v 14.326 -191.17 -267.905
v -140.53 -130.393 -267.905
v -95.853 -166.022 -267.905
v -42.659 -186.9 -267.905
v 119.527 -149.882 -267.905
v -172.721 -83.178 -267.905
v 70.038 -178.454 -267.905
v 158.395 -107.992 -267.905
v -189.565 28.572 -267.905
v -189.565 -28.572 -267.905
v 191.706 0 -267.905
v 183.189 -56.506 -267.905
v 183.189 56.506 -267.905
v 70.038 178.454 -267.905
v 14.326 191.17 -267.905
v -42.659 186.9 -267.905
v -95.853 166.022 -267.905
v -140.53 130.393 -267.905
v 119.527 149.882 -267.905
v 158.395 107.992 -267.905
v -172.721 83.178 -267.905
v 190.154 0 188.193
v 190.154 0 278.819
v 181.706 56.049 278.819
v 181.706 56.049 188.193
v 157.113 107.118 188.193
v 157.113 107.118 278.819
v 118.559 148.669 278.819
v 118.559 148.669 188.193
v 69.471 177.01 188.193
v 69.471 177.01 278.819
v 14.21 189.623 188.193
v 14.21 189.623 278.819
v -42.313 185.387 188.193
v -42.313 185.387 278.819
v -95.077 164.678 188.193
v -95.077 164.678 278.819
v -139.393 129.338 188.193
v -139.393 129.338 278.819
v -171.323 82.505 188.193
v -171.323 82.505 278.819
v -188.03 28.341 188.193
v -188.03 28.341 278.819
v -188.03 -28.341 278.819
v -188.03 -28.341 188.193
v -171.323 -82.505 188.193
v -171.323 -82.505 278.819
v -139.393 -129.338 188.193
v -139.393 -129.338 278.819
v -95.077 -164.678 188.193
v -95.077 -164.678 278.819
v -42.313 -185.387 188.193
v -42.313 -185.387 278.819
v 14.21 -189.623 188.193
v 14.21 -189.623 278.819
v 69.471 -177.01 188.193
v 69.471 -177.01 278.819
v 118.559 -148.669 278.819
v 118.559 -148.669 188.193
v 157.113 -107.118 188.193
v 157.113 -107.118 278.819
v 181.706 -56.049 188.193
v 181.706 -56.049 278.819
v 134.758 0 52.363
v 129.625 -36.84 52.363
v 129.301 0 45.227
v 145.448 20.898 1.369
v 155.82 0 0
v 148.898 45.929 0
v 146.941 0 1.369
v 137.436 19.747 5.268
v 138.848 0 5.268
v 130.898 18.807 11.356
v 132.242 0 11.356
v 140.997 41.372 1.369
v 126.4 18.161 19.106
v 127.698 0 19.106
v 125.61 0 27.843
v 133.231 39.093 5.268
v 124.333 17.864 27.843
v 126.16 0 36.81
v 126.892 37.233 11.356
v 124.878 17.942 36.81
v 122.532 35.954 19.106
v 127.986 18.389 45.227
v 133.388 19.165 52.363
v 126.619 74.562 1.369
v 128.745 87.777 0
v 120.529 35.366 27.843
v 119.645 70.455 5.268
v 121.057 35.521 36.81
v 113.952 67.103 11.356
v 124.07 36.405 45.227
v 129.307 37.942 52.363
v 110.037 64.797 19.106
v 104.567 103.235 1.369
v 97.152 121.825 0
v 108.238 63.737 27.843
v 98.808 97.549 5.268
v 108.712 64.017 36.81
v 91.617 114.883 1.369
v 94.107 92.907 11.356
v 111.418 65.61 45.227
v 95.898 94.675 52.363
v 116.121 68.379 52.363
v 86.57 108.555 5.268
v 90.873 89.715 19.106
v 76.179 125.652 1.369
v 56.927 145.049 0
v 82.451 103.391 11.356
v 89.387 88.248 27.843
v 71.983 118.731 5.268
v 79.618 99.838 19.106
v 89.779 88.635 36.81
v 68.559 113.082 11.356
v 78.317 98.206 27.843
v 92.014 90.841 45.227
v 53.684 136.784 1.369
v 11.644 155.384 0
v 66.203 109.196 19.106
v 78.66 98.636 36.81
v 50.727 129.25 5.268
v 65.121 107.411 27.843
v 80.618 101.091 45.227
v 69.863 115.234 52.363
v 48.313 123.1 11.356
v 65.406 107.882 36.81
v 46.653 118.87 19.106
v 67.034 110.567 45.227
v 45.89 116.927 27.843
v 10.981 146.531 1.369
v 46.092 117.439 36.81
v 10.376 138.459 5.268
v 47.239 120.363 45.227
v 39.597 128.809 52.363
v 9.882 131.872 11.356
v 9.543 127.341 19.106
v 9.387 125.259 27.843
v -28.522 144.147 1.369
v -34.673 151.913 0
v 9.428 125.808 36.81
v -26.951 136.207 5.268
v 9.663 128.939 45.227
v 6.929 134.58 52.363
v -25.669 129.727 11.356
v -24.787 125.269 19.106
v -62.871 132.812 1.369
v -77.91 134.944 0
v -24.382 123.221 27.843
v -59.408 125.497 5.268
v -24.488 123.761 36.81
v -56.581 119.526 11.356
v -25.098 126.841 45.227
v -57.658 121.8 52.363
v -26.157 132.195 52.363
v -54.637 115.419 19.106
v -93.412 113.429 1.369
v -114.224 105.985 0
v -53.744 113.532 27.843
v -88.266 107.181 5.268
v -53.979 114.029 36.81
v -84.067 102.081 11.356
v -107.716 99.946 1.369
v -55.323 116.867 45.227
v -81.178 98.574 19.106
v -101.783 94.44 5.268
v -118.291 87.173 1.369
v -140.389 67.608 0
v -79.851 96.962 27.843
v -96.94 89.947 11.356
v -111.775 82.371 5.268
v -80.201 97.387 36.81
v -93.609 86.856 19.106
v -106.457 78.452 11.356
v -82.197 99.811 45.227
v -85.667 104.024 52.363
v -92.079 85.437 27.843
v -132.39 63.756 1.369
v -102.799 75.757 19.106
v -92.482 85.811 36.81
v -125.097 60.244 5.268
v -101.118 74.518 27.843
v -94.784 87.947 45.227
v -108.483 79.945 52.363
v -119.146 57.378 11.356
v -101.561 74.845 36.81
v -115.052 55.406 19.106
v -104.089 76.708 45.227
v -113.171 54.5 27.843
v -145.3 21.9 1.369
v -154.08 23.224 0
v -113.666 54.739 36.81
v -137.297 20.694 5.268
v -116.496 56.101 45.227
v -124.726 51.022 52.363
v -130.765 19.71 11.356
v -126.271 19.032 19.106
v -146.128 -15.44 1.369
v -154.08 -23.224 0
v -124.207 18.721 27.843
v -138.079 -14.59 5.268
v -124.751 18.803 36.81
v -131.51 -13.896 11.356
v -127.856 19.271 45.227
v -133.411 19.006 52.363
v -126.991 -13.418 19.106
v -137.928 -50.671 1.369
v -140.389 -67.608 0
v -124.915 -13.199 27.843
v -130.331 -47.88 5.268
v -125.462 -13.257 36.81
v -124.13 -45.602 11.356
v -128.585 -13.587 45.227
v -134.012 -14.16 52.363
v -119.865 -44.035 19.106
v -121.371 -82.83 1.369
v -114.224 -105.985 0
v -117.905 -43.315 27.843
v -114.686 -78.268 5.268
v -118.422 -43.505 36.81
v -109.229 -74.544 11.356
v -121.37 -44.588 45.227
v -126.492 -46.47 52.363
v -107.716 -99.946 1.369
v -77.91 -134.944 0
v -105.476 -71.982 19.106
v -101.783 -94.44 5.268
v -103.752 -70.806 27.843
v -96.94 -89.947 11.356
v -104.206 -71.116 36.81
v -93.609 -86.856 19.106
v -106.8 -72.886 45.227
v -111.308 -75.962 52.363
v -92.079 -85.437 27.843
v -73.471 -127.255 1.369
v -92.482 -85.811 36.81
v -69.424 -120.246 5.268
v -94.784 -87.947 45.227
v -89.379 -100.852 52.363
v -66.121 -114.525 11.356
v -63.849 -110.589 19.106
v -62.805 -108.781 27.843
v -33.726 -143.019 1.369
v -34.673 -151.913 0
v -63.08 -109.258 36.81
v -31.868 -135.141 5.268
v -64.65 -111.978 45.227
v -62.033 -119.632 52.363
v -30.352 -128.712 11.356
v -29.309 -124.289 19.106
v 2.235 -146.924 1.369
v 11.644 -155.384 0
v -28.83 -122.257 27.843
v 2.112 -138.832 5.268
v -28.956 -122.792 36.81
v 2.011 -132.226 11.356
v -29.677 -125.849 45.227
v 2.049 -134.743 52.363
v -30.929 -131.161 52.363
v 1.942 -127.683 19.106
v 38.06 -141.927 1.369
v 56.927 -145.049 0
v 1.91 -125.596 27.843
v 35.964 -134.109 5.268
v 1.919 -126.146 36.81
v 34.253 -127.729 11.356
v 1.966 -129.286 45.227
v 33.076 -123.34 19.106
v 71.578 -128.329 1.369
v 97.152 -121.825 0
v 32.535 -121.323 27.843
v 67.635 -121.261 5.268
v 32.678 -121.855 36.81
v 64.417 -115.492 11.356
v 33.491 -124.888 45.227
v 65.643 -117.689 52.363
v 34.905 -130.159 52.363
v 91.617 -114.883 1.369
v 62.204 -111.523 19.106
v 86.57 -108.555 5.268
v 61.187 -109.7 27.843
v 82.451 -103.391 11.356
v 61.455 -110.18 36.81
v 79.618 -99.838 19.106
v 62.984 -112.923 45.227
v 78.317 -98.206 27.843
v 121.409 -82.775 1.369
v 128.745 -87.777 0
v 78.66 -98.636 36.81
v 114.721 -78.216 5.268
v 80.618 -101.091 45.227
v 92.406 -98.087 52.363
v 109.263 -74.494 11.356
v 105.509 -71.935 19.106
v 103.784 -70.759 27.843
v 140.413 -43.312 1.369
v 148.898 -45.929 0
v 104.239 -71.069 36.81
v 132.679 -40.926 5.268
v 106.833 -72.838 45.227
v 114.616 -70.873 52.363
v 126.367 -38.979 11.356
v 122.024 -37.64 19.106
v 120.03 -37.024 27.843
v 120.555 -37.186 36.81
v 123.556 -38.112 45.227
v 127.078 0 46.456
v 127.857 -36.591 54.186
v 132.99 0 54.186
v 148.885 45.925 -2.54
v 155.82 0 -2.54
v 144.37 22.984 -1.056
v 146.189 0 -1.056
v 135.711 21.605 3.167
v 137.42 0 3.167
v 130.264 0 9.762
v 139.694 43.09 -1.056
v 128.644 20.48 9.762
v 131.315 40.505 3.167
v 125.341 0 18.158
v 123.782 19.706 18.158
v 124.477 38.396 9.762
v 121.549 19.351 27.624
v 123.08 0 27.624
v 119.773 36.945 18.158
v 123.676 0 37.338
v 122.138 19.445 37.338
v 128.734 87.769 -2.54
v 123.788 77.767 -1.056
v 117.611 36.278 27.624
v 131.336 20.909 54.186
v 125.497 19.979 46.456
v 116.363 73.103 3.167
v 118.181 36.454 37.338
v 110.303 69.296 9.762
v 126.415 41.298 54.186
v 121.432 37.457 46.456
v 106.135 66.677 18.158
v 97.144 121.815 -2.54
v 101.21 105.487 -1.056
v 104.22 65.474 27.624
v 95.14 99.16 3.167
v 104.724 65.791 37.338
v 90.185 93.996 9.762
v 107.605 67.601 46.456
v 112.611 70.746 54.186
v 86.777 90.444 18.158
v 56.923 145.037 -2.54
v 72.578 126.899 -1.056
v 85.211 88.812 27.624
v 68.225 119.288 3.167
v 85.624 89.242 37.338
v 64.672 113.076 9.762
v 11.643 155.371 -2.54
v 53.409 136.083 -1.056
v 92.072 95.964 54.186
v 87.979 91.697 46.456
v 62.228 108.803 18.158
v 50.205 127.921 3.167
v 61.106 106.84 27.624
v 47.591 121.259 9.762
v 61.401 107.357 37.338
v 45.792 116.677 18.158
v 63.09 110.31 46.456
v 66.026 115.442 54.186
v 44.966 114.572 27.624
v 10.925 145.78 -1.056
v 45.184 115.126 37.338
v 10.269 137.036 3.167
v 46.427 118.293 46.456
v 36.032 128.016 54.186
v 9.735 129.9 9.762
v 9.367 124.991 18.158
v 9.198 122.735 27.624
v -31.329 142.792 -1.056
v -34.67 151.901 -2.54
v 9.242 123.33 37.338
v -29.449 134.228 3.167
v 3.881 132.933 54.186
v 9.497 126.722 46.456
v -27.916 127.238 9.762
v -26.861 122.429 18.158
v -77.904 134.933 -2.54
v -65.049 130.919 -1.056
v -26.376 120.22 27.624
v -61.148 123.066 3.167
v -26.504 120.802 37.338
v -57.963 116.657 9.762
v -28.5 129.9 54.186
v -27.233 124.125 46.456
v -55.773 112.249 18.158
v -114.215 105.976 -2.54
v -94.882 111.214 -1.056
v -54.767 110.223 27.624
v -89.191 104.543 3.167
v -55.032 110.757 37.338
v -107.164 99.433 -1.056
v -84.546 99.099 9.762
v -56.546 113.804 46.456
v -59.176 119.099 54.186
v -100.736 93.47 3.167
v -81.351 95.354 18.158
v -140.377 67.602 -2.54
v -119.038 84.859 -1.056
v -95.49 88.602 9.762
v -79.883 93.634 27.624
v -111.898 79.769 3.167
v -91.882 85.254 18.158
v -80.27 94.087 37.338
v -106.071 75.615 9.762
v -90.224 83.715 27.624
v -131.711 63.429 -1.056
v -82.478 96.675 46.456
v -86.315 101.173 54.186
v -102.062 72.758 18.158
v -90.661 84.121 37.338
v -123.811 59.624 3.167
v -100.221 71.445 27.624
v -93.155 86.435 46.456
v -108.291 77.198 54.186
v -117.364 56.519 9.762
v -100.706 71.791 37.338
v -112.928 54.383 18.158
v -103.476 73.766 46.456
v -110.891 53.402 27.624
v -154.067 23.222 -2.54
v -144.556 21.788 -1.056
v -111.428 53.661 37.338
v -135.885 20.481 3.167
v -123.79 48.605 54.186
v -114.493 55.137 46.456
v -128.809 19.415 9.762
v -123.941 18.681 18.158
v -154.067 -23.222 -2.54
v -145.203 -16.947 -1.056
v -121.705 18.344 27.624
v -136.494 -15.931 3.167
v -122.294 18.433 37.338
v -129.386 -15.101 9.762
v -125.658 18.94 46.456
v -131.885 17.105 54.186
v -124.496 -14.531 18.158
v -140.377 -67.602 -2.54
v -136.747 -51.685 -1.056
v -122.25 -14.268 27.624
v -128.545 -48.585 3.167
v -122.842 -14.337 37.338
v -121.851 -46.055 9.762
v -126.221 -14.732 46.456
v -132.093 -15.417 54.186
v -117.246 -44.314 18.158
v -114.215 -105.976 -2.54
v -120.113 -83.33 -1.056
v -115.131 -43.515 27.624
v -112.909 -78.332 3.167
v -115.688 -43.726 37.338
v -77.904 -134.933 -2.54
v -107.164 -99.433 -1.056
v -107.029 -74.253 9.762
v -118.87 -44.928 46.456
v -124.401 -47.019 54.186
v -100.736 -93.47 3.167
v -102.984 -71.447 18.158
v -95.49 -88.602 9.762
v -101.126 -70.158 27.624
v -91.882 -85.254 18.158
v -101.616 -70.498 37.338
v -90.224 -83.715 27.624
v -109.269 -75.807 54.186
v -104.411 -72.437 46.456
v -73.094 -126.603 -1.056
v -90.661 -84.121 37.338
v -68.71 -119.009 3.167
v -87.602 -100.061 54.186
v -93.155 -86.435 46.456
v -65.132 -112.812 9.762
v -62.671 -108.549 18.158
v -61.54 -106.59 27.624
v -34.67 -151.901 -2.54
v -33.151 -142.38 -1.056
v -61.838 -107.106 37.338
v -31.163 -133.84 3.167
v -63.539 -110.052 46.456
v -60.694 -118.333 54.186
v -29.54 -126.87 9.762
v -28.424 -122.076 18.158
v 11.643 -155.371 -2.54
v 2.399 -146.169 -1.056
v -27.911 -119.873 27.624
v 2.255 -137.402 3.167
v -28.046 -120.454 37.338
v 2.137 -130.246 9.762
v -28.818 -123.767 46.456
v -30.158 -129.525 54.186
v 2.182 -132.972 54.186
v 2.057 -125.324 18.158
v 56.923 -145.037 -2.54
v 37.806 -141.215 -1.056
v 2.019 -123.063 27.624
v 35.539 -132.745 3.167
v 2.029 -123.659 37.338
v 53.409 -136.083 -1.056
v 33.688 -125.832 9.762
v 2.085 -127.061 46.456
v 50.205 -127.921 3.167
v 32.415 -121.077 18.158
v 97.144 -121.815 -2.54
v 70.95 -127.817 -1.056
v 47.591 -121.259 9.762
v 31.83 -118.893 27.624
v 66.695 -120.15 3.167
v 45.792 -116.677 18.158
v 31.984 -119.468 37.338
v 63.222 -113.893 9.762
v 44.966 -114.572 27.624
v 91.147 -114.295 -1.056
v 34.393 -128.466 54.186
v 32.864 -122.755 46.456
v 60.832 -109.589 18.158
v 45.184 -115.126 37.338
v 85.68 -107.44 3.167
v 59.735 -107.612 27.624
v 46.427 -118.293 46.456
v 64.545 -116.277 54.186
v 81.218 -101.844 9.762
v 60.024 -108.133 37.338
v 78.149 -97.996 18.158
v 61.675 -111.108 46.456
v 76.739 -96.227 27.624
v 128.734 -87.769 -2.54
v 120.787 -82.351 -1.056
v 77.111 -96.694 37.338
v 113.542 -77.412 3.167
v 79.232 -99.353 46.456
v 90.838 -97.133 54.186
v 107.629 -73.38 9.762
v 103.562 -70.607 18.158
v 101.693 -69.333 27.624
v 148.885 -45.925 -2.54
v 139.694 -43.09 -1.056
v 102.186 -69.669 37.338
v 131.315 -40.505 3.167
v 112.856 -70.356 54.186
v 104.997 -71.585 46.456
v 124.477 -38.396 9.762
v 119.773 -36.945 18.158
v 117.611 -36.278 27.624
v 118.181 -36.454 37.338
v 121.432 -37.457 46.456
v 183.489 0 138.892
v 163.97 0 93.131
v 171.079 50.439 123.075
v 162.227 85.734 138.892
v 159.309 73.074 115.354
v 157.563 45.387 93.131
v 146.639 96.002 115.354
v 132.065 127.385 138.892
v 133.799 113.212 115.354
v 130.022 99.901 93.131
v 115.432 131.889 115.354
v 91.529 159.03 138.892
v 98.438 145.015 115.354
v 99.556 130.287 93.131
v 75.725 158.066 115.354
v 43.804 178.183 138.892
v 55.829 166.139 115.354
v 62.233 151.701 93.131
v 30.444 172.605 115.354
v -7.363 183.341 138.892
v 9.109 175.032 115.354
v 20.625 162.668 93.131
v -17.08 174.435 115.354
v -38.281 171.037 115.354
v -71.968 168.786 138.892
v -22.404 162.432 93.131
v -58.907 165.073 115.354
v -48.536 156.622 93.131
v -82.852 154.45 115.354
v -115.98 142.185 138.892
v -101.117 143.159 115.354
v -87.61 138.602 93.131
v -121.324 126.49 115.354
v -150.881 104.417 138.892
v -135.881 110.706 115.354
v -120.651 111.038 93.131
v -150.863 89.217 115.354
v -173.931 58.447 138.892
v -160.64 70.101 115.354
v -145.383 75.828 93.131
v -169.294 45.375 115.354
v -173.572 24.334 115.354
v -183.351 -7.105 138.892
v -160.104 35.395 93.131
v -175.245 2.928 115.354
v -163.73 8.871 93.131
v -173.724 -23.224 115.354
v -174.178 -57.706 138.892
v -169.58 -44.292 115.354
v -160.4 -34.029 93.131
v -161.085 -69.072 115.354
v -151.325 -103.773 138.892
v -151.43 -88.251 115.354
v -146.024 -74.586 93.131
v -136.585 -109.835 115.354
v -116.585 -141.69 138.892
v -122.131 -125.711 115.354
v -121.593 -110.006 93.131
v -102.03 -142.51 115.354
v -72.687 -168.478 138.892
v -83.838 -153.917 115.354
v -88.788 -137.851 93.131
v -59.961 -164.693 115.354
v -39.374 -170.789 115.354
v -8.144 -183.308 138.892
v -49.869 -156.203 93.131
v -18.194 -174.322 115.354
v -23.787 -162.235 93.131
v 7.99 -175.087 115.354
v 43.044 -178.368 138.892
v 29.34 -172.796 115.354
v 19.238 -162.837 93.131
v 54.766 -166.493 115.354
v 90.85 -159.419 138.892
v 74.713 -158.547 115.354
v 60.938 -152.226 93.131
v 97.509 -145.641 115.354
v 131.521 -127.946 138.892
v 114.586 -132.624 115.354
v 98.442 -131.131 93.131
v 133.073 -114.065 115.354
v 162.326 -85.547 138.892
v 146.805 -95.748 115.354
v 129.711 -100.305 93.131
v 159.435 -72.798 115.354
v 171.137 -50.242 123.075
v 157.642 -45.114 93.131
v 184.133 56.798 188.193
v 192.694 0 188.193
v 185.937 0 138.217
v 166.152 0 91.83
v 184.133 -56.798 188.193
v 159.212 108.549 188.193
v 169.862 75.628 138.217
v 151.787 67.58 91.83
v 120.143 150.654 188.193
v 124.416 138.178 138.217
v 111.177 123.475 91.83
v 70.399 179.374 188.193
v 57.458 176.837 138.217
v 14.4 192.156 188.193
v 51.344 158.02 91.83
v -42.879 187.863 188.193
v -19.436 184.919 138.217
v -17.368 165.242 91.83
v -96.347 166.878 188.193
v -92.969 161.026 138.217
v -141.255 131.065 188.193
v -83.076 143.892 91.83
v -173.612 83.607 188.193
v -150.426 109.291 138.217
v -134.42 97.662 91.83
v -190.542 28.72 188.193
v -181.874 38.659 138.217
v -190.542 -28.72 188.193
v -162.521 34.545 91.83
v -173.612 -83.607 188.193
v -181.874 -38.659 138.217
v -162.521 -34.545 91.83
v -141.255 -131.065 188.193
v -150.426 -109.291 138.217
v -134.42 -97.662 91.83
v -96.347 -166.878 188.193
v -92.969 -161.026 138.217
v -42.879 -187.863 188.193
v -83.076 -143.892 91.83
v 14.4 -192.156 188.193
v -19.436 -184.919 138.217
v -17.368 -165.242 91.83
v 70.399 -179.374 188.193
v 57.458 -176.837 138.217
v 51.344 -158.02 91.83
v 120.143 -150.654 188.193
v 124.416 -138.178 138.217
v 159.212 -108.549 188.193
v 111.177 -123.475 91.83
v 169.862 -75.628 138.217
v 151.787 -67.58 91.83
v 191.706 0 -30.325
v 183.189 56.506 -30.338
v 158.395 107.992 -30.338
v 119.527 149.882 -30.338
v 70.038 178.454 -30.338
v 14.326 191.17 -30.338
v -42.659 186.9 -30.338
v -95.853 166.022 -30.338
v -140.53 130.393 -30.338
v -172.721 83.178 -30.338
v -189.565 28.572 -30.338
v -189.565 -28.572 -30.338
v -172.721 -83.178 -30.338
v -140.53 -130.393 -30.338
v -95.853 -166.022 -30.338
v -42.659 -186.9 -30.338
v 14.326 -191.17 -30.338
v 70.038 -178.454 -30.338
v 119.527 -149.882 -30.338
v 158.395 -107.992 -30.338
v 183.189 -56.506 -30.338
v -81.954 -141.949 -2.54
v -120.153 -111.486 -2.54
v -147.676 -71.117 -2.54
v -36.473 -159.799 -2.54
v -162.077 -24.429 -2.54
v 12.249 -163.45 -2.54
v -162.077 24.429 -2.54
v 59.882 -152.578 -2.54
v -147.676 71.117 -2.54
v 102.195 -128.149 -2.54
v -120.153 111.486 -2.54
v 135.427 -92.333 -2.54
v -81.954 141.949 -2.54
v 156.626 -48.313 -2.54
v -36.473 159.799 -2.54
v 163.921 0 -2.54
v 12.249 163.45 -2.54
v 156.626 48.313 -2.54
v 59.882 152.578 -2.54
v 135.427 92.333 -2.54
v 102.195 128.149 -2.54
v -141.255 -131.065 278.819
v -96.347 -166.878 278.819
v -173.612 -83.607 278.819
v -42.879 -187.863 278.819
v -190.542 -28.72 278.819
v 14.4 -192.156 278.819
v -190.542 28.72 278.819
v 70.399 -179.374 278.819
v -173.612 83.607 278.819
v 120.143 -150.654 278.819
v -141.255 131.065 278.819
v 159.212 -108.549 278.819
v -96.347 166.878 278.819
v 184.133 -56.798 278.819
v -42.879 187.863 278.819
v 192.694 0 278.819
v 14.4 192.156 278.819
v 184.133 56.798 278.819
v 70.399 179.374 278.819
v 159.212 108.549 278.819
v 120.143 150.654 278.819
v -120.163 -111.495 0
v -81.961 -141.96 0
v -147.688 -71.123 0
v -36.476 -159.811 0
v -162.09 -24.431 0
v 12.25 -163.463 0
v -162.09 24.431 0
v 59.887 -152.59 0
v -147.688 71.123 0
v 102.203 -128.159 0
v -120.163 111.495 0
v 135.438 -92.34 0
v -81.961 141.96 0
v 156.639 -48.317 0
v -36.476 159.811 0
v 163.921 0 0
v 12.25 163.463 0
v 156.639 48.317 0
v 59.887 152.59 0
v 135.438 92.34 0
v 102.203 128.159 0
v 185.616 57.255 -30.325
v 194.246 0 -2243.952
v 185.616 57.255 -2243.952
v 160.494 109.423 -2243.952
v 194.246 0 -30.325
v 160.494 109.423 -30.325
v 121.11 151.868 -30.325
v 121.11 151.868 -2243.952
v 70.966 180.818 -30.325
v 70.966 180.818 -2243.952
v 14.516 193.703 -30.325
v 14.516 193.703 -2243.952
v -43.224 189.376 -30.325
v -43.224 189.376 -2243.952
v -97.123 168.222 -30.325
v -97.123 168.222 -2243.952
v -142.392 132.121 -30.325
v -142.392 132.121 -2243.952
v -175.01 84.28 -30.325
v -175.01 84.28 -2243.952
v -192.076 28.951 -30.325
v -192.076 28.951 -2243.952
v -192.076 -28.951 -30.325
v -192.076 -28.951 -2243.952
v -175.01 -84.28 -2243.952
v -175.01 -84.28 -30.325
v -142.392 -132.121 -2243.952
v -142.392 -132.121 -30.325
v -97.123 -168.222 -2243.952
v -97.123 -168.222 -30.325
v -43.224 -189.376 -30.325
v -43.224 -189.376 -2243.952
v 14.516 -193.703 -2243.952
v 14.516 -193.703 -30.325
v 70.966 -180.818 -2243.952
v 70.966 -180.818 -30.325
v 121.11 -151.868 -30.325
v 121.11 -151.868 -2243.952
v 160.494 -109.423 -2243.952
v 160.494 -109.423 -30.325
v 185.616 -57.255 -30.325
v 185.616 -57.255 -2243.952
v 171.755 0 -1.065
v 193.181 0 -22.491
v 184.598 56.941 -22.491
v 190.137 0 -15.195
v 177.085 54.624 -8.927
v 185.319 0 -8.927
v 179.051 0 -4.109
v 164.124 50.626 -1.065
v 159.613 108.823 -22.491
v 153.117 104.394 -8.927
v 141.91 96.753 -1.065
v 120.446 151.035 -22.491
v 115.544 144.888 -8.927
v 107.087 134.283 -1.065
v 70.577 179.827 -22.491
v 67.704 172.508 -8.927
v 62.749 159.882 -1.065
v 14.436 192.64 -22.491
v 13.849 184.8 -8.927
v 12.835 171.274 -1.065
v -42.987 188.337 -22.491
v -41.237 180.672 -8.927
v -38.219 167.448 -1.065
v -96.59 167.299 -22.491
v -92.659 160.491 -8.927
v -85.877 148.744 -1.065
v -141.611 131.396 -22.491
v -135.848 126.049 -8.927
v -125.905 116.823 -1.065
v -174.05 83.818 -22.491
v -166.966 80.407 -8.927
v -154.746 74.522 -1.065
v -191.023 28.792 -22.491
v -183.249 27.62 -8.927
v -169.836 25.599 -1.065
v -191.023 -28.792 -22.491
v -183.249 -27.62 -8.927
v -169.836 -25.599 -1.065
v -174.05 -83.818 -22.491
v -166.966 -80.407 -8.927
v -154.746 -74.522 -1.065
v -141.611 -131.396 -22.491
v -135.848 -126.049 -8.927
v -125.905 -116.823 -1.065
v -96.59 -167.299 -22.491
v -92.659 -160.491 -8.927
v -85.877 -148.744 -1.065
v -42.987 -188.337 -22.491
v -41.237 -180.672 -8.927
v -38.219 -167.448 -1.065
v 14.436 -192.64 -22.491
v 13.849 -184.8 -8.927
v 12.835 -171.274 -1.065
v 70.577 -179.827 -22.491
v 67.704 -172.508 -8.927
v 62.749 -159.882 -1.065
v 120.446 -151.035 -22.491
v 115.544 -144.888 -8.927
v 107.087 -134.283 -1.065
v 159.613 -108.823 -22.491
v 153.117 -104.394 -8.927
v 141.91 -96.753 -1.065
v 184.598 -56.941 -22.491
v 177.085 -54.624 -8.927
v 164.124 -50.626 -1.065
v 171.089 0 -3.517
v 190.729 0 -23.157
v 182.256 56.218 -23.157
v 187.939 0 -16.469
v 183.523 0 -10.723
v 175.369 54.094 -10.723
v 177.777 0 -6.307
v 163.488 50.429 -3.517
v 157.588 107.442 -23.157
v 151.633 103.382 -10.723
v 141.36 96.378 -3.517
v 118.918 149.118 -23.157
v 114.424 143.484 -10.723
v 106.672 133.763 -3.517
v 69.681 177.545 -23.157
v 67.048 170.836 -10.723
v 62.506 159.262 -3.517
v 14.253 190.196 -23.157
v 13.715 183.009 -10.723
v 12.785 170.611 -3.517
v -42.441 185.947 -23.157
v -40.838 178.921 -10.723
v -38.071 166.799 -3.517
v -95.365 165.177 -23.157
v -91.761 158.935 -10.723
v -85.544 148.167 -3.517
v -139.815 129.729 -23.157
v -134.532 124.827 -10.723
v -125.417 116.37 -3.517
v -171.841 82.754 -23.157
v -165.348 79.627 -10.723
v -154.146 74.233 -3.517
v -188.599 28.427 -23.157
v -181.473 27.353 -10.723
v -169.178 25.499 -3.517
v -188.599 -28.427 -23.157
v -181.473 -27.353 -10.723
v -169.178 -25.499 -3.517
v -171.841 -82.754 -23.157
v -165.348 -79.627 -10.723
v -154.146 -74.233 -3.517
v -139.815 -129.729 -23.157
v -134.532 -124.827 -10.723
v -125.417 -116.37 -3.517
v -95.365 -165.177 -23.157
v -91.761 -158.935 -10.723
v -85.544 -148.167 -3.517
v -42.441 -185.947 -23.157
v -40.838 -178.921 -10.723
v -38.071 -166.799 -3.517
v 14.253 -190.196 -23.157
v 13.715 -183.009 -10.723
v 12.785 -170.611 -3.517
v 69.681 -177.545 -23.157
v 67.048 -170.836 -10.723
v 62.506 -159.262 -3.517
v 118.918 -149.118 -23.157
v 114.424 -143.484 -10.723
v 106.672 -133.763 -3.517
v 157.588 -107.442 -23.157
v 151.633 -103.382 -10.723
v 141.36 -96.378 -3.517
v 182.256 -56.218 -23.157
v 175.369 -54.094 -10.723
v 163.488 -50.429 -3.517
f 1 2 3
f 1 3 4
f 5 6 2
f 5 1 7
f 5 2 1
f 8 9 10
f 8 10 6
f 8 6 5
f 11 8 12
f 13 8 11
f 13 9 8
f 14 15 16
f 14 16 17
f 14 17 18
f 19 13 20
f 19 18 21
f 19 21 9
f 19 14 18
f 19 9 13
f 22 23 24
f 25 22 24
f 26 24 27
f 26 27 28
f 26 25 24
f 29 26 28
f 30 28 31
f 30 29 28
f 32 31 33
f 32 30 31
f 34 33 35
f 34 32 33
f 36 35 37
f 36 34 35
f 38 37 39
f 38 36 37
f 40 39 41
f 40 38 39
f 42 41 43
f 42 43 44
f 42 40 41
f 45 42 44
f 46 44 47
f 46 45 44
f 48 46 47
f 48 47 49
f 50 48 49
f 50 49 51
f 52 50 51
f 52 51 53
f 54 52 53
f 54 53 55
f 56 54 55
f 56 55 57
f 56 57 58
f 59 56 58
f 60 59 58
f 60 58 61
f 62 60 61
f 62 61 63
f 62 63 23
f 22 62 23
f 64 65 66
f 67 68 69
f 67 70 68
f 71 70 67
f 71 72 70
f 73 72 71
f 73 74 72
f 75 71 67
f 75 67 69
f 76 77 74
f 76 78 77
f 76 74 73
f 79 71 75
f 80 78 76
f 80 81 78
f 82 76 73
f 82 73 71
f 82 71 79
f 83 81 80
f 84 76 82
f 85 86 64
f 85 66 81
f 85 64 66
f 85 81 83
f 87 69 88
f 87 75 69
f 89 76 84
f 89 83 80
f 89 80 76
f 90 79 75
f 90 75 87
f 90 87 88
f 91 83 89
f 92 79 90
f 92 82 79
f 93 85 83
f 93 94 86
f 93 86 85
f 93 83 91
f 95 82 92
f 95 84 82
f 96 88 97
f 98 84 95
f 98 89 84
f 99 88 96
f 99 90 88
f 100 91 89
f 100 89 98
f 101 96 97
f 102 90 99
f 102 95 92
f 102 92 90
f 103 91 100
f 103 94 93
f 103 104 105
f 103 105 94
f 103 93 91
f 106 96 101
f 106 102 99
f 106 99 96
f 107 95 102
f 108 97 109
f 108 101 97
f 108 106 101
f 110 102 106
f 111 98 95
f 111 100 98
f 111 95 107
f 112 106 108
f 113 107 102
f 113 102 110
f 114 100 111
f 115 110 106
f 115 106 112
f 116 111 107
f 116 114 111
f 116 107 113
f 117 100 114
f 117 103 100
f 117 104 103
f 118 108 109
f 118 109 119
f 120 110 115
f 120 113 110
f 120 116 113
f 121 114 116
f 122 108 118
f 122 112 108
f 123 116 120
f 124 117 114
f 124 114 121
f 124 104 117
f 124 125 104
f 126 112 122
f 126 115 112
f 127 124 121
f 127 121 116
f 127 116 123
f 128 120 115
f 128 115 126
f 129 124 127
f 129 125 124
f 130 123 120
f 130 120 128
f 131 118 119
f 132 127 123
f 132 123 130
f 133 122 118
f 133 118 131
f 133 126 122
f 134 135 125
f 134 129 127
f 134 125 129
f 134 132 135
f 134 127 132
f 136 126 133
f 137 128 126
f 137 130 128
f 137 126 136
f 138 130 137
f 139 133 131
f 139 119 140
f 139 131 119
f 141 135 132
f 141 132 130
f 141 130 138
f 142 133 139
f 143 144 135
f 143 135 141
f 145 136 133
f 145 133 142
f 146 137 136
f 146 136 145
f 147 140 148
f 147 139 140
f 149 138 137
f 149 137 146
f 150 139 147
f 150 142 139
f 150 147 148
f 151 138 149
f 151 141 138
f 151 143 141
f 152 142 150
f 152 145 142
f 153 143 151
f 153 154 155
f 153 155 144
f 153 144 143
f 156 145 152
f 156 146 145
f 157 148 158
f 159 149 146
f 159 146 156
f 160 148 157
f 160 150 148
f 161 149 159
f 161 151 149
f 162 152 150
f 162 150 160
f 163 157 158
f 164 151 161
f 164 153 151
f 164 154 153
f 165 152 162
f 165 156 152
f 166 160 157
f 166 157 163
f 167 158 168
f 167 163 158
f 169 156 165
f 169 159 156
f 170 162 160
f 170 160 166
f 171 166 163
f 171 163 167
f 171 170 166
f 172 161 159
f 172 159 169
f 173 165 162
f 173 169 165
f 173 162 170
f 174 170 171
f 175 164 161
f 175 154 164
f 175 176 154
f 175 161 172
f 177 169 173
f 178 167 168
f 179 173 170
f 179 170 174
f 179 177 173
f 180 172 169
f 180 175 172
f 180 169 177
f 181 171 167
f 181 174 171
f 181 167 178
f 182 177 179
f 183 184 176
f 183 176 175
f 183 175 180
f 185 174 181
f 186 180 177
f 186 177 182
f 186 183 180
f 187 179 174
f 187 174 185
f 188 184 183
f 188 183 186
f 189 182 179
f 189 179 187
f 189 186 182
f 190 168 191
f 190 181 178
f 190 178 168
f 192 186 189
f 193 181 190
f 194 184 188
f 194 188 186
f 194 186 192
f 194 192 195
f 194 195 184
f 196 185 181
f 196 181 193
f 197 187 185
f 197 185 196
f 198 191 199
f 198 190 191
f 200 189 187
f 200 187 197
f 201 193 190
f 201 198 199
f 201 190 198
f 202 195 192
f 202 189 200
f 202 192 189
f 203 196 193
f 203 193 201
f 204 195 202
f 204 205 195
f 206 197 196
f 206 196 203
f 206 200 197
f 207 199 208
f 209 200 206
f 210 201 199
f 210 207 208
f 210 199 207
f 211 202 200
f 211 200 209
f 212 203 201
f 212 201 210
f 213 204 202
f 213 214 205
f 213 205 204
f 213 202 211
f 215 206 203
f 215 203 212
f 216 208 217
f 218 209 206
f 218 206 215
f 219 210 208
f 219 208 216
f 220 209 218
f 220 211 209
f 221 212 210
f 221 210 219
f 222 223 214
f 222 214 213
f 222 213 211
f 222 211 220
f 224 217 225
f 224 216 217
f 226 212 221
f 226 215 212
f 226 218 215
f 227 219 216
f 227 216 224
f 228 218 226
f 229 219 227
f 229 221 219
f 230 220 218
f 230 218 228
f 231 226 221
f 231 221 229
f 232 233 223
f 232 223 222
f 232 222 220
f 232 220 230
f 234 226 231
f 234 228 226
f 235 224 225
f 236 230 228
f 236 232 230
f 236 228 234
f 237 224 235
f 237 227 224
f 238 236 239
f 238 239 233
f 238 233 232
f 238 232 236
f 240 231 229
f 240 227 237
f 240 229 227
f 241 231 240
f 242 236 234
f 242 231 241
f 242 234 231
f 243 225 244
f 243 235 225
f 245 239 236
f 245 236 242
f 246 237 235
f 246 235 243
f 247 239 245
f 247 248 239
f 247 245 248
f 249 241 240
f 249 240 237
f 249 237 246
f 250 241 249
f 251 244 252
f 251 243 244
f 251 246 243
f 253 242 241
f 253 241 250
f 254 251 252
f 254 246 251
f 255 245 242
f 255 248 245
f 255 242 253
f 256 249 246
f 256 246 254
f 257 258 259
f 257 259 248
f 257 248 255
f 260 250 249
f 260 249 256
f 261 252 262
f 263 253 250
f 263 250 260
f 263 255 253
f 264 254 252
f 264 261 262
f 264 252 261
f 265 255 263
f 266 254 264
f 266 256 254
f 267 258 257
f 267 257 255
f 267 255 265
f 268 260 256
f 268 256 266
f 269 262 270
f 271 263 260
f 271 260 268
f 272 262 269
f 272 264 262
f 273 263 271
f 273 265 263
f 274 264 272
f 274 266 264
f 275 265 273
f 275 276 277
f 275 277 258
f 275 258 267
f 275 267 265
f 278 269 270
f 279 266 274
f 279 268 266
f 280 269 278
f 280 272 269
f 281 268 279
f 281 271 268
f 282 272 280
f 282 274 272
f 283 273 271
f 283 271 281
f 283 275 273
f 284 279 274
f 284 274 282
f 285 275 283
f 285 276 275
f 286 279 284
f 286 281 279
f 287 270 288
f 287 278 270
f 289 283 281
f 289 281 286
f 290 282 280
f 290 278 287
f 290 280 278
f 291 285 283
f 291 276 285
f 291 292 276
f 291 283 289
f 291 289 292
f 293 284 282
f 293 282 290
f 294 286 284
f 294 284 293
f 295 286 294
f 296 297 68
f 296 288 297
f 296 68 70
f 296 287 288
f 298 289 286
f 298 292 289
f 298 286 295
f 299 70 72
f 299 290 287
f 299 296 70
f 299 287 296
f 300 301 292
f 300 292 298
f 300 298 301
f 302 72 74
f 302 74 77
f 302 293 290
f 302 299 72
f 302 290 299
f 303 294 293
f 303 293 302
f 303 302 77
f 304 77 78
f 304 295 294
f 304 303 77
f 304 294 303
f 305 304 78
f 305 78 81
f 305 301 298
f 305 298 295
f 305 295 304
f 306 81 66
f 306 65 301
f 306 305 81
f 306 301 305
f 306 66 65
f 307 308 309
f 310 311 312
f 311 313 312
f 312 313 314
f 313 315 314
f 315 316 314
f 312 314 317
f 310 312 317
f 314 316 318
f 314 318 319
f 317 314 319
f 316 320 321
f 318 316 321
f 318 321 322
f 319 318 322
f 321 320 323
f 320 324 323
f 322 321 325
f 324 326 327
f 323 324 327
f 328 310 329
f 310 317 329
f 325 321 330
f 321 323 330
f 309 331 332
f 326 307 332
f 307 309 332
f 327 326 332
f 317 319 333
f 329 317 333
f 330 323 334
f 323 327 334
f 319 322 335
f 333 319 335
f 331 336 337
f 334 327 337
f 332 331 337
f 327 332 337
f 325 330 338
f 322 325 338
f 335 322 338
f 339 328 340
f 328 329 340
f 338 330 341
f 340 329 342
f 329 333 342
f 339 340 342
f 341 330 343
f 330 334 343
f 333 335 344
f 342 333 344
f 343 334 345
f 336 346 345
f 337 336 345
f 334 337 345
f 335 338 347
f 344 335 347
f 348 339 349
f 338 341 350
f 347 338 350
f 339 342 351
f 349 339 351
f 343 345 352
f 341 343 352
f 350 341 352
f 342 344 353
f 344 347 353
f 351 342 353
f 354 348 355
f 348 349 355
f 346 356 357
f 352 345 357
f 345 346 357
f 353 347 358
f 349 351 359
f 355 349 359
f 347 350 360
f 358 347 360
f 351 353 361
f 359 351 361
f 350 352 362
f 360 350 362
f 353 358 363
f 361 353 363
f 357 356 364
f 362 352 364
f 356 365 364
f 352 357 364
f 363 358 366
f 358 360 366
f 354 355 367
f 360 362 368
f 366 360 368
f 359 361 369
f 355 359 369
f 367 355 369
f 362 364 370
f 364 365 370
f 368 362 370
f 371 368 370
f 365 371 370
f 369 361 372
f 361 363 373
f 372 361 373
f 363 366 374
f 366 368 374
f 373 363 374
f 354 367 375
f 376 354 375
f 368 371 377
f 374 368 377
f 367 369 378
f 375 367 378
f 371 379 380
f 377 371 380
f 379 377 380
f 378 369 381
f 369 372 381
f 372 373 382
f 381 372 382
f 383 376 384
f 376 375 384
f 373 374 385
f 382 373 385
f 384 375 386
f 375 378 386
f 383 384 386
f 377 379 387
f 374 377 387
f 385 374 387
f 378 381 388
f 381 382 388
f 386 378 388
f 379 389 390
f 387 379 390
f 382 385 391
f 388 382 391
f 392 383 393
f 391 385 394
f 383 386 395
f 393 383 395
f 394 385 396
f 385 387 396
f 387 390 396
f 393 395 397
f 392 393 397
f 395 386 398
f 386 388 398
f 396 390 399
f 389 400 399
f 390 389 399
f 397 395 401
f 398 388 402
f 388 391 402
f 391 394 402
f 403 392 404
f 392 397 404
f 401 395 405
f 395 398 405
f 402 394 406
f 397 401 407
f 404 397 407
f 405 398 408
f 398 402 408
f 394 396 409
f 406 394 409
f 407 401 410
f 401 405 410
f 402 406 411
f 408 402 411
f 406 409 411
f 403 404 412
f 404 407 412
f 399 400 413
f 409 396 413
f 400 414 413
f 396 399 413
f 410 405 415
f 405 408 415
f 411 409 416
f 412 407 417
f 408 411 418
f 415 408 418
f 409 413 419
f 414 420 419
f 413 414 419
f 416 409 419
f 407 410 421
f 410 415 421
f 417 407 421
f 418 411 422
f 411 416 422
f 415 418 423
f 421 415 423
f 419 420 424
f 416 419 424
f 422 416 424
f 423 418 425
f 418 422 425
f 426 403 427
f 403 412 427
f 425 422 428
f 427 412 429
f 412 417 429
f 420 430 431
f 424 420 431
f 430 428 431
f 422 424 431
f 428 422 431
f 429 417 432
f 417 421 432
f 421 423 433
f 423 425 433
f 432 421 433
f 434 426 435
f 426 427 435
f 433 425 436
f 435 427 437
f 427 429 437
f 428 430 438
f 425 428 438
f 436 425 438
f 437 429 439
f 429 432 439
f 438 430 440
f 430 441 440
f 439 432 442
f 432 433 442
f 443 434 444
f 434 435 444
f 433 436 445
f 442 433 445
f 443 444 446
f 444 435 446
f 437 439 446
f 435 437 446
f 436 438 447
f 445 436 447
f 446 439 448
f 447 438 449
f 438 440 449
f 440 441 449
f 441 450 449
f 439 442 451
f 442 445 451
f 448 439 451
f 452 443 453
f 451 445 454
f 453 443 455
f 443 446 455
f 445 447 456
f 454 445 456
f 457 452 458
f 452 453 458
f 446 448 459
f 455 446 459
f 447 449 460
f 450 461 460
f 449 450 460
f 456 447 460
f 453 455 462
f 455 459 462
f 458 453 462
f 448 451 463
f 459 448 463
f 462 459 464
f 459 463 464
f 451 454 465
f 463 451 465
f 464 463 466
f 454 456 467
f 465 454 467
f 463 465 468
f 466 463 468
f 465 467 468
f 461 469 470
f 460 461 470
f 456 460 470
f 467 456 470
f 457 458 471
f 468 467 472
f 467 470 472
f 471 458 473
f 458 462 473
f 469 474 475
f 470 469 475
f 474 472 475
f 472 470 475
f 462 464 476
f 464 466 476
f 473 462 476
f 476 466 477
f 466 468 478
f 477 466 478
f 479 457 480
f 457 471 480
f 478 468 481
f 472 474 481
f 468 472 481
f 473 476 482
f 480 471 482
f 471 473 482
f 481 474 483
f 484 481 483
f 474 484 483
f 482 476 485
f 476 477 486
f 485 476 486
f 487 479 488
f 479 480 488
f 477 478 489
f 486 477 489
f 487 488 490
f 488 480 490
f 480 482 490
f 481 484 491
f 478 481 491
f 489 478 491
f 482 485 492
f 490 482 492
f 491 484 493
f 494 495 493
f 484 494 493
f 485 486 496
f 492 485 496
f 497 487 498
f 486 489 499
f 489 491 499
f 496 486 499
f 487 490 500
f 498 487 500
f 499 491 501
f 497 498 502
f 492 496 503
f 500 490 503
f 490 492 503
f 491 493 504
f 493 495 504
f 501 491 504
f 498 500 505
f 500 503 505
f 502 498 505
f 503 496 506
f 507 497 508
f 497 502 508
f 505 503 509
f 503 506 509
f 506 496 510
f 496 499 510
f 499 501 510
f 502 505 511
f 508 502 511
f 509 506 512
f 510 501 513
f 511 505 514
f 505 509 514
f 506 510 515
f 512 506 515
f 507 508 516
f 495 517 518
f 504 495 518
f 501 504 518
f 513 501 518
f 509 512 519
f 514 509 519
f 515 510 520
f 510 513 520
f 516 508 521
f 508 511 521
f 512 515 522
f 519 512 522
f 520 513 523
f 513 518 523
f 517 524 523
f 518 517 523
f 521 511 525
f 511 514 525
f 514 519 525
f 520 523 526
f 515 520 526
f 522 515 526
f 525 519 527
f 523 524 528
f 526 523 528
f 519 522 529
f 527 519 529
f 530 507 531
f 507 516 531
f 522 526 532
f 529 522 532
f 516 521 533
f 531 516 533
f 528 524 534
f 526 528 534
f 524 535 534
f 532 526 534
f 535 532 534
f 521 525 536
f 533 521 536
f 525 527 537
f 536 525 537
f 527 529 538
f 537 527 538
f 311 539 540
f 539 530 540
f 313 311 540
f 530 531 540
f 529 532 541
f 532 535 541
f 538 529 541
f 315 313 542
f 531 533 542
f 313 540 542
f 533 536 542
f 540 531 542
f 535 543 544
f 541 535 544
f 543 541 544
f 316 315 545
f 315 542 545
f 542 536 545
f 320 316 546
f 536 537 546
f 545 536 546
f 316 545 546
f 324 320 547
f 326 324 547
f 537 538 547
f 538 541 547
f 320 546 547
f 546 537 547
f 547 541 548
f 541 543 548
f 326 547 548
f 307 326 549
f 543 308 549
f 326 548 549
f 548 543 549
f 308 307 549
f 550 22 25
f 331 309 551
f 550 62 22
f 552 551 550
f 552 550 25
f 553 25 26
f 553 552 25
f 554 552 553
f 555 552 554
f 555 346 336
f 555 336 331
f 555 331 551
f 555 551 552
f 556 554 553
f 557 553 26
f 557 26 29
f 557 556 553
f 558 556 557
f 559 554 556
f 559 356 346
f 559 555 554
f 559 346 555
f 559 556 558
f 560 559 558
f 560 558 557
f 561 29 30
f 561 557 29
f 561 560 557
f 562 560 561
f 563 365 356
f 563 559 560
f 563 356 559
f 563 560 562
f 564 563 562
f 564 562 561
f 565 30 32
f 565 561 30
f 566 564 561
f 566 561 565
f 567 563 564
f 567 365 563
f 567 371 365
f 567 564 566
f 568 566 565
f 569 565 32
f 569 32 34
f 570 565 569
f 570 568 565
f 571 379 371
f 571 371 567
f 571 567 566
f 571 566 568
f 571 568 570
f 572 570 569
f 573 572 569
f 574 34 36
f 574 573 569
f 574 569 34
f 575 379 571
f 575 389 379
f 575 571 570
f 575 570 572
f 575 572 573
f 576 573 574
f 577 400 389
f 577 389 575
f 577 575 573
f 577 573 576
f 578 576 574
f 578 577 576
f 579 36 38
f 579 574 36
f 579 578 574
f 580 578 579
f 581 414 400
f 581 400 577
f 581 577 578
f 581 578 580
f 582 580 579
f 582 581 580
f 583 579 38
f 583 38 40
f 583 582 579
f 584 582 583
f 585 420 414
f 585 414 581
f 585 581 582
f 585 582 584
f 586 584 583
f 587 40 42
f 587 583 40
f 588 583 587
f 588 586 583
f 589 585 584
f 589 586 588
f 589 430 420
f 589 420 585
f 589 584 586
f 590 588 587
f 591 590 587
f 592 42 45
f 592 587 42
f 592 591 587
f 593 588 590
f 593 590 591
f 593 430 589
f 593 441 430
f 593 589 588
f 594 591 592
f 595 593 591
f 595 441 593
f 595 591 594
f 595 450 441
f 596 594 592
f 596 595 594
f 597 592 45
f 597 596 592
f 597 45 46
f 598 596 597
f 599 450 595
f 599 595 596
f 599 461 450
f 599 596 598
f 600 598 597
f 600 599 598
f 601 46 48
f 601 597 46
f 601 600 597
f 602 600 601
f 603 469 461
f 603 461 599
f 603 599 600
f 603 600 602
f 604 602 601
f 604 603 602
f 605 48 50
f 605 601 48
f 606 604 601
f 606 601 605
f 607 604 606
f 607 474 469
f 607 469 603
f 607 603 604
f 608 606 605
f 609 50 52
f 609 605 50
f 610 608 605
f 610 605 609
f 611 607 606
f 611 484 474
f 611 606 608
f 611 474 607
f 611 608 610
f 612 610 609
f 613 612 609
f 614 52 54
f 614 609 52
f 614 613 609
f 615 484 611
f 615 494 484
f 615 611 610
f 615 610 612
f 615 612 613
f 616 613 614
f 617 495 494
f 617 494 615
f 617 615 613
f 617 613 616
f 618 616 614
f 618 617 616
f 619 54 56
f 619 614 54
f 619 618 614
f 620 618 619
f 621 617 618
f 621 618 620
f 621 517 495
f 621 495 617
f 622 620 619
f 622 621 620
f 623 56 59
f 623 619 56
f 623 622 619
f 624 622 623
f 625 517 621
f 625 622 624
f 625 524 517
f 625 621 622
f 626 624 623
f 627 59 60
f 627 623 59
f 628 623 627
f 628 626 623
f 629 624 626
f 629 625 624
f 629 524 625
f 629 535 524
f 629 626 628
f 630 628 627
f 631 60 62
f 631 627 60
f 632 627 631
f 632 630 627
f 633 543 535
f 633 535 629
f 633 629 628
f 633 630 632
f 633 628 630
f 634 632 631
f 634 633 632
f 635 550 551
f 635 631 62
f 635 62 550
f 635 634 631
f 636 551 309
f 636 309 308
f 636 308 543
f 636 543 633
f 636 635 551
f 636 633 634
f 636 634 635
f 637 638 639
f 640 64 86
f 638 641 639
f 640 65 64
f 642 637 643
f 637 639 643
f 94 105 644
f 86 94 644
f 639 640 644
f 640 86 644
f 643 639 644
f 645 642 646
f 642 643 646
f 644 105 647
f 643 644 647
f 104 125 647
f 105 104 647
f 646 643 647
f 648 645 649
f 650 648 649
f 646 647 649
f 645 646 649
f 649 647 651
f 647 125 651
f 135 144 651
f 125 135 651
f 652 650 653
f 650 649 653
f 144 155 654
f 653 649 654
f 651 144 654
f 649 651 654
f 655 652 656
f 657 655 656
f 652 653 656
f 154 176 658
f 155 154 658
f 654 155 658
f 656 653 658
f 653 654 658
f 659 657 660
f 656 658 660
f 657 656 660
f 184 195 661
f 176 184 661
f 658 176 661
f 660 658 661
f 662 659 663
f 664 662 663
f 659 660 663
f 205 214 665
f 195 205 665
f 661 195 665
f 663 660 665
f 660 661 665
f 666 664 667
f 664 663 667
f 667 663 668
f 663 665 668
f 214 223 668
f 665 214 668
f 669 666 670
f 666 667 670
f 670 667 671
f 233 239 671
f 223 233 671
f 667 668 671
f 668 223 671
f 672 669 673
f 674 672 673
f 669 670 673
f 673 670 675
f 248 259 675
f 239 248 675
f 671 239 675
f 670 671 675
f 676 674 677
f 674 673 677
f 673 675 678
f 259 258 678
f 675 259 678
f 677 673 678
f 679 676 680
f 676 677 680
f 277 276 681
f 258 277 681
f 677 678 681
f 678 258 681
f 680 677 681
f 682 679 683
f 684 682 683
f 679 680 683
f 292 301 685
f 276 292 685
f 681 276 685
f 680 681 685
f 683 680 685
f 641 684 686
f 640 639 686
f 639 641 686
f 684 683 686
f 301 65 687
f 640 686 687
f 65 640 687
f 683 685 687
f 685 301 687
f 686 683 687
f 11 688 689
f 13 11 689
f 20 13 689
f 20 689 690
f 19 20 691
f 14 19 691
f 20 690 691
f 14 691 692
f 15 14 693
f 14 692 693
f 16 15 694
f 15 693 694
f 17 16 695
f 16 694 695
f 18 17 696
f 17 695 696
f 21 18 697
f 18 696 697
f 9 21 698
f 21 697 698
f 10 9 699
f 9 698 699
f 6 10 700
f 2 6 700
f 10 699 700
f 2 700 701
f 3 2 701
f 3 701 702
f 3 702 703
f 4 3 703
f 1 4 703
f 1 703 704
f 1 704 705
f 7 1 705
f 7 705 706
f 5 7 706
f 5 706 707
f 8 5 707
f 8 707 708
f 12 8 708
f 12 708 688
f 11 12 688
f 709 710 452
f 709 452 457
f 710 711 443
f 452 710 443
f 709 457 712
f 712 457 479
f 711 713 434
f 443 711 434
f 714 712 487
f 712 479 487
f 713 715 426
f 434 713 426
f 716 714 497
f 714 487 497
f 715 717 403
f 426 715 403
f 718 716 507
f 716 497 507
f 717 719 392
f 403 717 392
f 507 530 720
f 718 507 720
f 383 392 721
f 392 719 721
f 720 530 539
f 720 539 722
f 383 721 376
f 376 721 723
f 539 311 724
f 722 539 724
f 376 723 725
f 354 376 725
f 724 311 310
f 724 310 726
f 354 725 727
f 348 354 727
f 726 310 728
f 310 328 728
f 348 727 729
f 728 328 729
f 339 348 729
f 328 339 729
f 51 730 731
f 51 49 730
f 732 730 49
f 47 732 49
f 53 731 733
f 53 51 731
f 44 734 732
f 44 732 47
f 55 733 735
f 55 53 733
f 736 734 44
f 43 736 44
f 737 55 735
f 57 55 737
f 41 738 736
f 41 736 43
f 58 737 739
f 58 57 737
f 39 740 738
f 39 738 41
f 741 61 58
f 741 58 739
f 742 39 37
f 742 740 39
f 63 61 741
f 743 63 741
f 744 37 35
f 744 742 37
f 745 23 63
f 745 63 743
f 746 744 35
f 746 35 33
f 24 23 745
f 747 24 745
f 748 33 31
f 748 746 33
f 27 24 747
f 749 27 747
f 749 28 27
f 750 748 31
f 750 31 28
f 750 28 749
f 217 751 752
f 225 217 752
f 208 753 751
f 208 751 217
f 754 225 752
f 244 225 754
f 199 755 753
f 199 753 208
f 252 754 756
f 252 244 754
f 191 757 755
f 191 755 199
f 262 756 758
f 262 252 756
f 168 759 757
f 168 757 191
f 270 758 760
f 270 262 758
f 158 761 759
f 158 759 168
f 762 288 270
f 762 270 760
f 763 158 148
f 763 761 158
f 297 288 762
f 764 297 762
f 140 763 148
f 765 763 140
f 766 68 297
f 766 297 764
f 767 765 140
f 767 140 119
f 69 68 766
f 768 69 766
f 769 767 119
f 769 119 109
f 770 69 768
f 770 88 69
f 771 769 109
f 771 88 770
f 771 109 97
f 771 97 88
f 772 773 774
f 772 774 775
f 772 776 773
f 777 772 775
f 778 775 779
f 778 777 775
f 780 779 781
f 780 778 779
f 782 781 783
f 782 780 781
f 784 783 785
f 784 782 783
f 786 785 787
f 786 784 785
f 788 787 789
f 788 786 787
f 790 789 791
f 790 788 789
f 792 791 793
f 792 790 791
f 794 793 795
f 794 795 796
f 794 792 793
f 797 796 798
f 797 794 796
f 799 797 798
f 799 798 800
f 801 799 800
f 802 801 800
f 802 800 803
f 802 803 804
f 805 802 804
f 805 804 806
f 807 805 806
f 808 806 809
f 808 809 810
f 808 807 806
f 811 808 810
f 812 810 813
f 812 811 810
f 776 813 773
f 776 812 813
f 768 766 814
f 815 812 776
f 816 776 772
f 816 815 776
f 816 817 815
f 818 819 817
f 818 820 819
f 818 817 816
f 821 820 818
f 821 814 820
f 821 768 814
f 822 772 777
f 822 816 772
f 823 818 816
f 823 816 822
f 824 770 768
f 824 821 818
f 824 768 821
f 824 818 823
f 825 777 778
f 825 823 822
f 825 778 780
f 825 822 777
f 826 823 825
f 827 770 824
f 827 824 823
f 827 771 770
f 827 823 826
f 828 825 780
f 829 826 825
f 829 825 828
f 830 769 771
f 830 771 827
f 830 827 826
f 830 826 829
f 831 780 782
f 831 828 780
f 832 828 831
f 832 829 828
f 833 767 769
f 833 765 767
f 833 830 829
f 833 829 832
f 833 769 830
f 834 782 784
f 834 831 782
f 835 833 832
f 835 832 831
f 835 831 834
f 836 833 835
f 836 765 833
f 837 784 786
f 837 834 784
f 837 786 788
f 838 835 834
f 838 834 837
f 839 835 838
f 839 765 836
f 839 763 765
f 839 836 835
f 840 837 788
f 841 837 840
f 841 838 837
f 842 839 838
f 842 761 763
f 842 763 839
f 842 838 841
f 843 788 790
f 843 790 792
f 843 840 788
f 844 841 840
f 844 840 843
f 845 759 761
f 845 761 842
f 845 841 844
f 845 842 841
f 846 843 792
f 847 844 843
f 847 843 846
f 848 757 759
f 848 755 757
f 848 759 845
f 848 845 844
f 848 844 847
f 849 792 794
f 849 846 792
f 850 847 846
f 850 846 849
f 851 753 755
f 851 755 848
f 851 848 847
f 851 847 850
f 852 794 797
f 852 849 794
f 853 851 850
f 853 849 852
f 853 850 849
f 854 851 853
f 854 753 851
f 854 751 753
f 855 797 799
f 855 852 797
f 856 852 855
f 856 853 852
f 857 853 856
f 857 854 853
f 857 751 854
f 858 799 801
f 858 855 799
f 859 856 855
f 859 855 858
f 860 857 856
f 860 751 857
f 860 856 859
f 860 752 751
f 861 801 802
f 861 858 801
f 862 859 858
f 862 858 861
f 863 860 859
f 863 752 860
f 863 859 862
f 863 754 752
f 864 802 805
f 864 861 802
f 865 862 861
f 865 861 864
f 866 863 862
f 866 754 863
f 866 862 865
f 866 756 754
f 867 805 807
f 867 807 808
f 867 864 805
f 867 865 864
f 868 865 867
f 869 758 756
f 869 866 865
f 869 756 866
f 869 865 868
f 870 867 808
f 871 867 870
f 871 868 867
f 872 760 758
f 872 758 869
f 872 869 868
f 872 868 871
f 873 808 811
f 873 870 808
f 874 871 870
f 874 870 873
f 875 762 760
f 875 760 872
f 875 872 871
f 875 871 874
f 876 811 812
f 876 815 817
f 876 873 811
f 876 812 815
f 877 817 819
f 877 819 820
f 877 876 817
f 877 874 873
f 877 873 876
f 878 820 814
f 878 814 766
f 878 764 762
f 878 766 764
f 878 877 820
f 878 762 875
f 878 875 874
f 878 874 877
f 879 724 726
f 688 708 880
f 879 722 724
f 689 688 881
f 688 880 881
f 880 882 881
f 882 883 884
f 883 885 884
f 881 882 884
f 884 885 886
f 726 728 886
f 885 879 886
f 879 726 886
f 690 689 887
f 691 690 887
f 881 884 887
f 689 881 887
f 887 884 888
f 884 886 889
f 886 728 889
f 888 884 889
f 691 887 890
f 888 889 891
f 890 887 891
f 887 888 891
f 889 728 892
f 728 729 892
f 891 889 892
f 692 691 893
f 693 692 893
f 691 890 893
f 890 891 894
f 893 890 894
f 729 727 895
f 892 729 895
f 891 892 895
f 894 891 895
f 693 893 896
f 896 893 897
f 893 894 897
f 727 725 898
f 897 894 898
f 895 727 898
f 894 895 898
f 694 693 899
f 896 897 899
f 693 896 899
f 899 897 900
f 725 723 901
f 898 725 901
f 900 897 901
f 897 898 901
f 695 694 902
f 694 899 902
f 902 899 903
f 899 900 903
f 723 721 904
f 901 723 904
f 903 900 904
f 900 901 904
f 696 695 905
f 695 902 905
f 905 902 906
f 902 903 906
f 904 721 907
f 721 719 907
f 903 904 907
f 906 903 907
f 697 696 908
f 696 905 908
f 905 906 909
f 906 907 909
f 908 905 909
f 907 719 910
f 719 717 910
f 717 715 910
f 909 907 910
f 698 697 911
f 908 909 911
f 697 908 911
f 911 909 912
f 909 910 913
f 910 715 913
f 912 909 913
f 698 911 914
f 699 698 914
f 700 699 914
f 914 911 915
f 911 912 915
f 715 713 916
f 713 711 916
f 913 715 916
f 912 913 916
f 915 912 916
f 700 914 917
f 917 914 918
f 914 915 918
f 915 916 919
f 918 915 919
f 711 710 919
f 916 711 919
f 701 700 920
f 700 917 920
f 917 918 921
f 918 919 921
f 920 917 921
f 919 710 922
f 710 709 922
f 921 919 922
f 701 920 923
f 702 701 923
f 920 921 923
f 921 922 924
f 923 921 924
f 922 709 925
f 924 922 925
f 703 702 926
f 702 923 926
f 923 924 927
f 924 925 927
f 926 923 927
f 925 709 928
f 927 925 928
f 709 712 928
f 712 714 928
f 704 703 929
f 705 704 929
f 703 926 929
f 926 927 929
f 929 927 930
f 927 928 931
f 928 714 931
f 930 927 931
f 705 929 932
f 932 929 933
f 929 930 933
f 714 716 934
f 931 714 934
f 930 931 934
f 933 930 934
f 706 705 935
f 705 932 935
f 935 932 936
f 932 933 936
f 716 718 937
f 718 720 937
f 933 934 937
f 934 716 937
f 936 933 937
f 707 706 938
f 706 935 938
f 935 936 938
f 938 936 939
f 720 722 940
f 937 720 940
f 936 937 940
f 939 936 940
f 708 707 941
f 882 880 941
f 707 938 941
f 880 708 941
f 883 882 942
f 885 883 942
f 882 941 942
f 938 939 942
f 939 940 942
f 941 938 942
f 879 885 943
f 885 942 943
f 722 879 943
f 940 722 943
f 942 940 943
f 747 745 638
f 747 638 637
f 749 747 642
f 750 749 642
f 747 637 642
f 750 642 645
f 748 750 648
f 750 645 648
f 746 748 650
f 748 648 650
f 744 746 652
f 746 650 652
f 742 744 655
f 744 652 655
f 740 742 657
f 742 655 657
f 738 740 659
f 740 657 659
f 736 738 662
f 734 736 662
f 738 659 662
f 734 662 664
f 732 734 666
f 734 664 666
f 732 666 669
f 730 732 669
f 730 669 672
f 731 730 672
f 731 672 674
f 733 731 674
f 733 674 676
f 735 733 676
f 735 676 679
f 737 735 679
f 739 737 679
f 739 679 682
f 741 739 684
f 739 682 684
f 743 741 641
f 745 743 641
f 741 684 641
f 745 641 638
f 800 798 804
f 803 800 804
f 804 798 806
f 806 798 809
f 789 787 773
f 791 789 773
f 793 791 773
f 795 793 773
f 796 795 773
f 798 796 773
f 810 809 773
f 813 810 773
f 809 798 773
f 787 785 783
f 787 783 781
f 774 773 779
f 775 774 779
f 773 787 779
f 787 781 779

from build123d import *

# Parameters (mm, degrees)
F0_R     = 192.6943149474
F1_DEPTH = 278.8188457489
F2_R     = 188.1925897504
F3_R     = 194.2459802586
F4_DEPTH = 270.4450786114
F6_T     = -2.54
F7_DEPTH = 843.5312509537
F8_DEPTH = 1129.975438118


# Not quite as in the source:
# - a fillet or chamfer that OpenCascade refuses, or shapes differently, is made with other operations: its cross-section is extruded or revolved along the edge and cut away or added


with BuildPart() as f1:
    # F0 (on Top) → F1 (new body)
    with BuildSketch(Plane.XY):
        Circle(F0_R)
    extrude(amount=F1_DEPTH)

    # F2
    f2_edges = [f1.edges().sort_by_distance(p)[0] for p in [
        (-192.694315, 0, 0),
    ]]
    fillet(f2_edges, radius=F2_R)

    # F3 (on Top) → F4 (join)
    with BuildSketch(Plane.XY):
        Circle(F3_R)
    extrude(amount=-F4_DEPTH)

    # F5: fillet of radius 30.48 on 2 edges, made by hand

    # F5_s1 → F5_t2 (revolve)
    with BuildSketch(Plane.XZ):
        with BuildLine():
            ThreePointArc((155.9763121834, -0.0004), (127.6997450573, 19.1003639784), (134.862440304, 52.4635057638))
            Line((134.862440304, 52.4635057638), (132.7510531161, 54.6618417328))
            ThreePointArc((132.7510531161, 54.6618417328), (75.136788898, 14.3228364086), (4.501725197, 3.0480546074))
            Line((4.501725197, 3.0480546074), (4.501725197, -3.0480546074))
            ThreePointArc((4.501725197, -3.0480546074), (80.2390186902, -3.0480546074), (155.9763121834, -3.0484546074))
            Line((155.9763121834, -3.0484546074), (155.9763121834, -0.0004))
        make_face()
    revolve(axis=Axis((0, 0, 0), (0, 0, 1)))

    # F5_s3 → F5_t4 (revolve, cut)
    with BuildSketch(Plane.XZ):
        with BuildLine():
            ThreePointArc((194.2463802586, -30.4809656854), (185.3185949492, -8.9273853094), (163.7650145732, 0.0004))
            Line((163.7650145732, 0.0004), (163.7650145732, 3.0485365685))
            ThreePointArc((163.7650145732, 3.0485365685), (179.0054974159, 3.0481365685), (194.2459802586, 3.0481365685))
            Line((194.2459802586, 3.0481365685), (197.2941168272, 0))
            ThreePointArc((197.2941168272, 0), (197.2941168272, -15.2404828427), (197.2945168272, -30.4809656854))
            Line((197.2945168272, -30.4809656854), (194.2463802586, -30.4809656854))
        make_face()
    revolve(axis=Axis((0, 0, 0), (0, 0, 1)), mode=Mode.SUBTRACT)

    # F6
    f6_openings = [f1.faces().sort_by_distance(p)[0] for p in [
        (0, 0, 278.818846),
    ]]
    offset(amount=F6_T, openings=f6_openings)

    # F7 (add): a face of the model
    f7_faces = [f1.faces().sort_by_distance(p)[0] for p in [
        (0, 0, -270.4450786114),
    ]]
    extrude(f7_faces, amount=F7_DEPTH)

    # F8 (add): a face of the model
    f8_faces = [f1.faces().sort_by_distance(p)[0] for p in [
        (0, 0, -1113.976329565),
    ]]
    extrude(f8_faces, amount=F8_DEPTH)


solid = f1.part
